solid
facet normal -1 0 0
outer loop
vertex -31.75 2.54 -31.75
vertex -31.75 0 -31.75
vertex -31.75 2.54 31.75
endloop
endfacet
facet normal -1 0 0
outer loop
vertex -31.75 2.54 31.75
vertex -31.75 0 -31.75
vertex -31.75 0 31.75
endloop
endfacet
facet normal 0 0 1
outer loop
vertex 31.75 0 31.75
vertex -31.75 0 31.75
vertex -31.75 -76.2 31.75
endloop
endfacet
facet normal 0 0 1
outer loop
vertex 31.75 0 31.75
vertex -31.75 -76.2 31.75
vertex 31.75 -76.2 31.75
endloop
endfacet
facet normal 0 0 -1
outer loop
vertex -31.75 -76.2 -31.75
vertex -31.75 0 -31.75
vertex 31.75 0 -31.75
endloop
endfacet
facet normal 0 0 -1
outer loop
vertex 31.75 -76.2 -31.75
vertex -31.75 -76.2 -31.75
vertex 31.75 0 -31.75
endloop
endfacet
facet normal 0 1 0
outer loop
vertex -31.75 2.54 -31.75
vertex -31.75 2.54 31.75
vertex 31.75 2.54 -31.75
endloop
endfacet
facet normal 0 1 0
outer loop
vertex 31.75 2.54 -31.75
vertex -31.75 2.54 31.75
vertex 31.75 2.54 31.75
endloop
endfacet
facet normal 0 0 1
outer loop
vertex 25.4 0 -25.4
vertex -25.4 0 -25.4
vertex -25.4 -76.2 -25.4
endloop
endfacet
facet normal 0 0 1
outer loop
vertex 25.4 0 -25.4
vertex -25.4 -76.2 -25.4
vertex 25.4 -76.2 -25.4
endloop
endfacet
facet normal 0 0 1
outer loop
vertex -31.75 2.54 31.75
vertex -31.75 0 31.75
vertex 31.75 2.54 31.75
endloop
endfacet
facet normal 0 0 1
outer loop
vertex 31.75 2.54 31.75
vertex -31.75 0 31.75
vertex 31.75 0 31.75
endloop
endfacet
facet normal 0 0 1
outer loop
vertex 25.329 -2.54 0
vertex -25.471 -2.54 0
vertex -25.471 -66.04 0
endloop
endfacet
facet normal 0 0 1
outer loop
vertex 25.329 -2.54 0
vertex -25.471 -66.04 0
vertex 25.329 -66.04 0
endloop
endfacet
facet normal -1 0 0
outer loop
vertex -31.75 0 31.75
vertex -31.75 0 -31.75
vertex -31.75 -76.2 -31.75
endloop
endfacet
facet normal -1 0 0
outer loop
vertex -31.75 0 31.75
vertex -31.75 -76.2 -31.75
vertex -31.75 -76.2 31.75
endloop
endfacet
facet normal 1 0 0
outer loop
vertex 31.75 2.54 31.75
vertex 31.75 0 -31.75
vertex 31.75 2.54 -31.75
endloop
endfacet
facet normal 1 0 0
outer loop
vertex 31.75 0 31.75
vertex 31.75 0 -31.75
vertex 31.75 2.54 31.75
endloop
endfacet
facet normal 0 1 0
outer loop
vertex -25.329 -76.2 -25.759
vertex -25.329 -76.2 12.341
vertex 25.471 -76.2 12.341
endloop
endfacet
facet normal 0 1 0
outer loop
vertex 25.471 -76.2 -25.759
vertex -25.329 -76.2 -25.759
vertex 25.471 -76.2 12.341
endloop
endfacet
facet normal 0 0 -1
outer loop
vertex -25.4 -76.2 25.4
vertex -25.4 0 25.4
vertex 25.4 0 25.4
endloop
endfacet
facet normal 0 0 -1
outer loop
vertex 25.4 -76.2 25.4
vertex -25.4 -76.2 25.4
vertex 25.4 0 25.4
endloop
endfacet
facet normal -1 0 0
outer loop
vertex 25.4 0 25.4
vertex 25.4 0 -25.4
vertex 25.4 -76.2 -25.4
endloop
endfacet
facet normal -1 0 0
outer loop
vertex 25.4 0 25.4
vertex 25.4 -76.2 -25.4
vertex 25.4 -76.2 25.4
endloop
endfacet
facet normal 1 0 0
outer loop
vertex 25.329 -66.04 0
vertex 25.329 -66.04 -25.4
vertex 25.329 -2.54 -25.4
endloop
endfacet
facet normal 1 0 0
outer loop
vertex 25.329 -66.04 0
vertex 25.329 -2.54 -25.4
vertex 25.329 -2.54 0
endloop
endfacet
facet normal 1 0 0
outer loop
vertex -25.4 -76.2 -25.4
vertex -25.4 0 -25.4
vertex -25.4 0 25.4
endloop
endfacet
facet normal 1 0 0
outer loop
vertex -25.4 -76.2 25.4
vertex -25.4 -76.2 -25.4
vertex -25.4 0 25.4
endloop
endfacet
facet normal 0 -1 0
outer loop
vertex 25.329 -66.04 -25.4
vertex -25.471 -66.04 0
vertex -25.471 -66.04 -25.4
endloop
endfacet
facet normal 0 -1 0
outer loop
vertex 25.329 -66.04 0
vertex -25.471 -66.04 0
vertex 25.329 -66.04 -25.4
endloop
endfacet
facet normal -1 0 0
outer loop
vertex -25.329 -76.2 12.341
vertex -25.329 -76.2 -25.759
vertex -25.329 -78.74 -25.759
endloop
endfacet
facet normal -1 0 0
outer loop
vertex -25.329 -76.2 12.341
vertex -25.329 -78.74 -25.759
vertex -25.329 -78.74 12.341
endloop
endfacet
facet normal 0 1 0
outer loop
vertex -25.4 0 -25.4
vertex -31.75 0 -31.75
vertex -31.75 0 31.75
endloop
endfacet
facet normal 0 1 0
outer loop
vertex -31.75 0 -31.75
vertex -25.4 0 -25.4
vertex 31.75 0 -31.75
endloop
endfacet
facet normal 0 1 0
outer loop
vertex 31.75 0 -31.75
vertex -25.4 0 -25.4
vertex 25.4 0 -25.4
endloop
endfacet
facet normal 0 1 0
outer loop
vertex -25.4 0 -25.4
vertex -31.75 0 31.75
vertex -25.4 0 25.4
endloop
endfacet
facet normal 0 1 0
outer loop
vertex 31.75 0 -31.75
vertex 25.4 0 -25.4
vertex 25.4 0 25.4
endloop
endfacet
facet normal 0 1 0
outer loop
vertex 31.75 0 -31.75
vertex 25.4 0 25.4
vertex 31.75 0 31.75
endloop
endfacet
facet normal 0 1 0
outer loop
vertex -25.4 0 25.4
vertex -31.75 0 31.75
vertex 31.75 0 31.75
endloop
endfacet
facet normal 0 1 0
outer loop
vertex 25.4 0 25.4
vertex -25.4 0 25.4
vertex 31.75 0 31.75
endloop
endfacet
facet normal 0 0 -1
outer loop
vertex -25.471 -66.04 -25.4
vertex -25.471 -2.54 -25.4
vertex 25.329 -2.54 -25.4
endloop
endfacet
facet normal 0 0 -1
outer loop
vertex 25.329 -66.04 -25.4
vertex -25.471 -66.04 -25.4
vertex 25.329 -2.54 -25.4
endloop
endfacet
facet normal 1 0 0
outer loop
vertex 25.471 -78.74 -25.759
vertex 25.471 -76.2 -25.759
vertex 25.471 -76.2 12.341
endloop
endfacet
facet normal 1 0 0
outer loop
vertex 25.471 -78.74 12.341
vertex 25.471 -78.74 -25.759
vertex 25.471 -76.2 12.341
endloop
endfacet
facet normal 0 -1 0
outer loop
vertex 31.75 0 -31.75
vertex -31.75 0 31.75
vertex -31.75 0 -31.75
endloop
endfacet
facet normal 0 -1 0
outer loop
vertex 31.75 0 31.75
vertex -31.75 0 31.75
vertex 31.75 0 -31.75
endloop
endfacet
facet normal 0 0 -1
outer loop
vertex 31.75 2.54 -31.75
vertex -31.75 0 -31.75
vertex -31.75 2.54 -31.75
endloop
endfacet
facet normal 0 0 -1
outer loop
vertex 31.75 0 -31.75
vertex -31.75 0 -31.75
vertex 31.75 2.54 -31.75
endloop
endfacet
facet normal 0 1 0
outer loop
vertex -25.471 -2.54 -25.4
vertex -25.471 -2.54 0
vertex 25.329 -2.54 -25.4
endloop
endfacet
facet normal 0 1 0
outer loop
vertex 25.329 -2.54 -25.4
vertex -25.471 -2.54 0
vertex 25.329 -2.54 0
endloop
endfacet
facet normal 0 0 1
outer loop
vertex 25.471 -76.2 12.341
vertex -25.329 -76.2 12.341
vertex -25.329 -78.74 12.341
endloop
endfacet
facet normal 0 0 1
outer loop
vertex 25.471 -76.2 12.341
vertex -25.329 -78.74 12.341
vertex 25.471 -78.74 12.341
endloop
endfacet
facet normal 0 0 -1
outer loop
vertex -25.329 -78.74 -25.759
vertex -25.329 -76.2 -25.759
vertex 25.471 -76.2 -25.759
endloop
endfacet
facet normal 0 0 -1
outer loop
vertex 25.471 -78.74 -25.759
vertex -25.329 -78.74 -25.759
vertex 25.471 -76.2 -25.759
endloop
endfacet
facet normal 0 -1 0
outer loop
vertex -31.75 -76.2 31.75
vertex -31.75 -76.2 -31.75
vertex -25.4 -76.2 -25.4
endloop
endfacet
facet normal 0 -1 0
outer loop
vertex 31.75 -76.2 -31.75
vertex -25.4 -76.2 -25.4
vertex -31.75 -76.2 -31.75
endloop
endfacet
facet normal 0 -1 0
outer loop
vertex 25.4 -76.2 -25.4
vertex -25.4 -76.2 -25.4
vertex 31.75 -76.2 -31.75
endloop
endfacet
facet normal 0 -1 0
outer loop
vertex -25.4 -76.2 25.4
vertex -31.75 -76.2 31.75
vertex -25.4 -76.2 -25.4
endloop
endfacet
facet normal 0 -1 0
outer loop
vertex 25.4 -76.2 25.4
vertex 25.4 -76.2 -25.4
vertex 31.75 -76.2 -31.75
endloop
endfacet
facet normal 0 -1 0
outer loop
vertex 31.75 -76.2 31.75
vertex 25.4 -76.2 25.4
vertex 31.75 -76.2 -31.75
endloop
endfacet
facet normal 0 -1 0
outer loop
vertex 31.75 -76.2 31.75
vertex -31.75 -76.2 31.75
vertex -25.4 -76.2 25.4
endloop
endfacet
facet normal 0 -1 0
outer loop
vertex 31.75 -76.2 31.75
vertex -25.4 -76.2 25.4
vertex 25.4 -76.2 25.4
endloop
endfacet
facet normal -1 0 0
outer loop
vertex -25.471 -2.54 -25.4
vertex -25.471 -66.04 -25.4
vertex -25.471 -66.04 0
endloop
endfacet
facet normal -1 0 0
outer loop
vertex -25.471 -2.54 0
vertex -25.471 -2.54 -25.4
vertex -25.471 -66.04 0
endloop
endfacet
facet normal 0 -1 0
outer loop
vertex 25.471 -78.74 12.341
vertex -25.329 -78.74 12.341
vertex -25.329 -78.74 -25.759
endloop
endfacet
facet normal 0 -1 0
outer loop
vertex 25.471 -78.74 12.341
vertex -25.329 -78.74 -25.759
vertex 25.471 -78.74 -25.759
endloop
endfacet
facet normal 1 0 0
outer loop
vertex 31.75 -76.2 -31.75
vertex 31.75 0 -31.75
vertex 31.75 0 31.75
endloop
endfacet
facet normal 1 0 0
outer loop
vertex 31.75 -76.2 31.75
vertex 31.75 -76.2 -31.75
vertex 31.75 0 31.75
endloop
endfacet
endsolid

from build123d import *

# Parameters (mm, degrees)
F1_W     = 63.5
F1_H     = 63.5
F2_DEPTH = 76.2
F4_W     = 50.8
F4_H     = 25.4
F5_DEPTH = 63.5
F6_W     = 50.8
F6_H     = 38.1
F7_DEPTH = 2.54
F8_DEPTH = 2.54
F0_W     = 50.8
F0_H     = 50.8
F9_DEPTH = 76.2


with BuildPart() as f2:
    # F1 (on Front) → F2 (new body)
    with BuildSketch(Plane.XZ):
        Rectangle(F1_W, F1_H)
    extrude(amount=F2_DEPTH)


with BuildPart() as f5:
    # F4 (on offset) → F5 (new body)
    with BuildSketch(Plane.XZ.offset(2.54)):
        with Locations((-0.070810011, -12.7)):
            Rectangle(F4_W, F4_H)
    extrude(amount=F5_DEPTH)


with BuildPart() as f7:
    # F6 (on face) → F7 (new body)
    with BuildSketch(Plane.XZ.offset(76.2)):
        with Locations((0.0708062857, -6.7086147636)):
            Rectangle(F6_W, F6_H)
    extrude(amount=F7_DEPTH)


with BuildPart() as f8:
    # F8 (new): a face of the model
    f8_faces = [f2.part.faces().sort_by_distance(p)[0] for p in [
        (0, 0, 0),
    ]]
    extrude(f8_faces, amount=F8_DEPTH)


with BuildPart() as f2_1:
    add(f2.part)

    # F0 (on Front) → F9 (cut)
    with BuildSketch(Plane.XZ):
        Rectangle(F0_W, F0_H)
    extrude(amount=F9_DEPTH, mode=Mode.SUBTRACT)


solid = Compound([f5.part, f7.part, f8.part, f2_1.part])
